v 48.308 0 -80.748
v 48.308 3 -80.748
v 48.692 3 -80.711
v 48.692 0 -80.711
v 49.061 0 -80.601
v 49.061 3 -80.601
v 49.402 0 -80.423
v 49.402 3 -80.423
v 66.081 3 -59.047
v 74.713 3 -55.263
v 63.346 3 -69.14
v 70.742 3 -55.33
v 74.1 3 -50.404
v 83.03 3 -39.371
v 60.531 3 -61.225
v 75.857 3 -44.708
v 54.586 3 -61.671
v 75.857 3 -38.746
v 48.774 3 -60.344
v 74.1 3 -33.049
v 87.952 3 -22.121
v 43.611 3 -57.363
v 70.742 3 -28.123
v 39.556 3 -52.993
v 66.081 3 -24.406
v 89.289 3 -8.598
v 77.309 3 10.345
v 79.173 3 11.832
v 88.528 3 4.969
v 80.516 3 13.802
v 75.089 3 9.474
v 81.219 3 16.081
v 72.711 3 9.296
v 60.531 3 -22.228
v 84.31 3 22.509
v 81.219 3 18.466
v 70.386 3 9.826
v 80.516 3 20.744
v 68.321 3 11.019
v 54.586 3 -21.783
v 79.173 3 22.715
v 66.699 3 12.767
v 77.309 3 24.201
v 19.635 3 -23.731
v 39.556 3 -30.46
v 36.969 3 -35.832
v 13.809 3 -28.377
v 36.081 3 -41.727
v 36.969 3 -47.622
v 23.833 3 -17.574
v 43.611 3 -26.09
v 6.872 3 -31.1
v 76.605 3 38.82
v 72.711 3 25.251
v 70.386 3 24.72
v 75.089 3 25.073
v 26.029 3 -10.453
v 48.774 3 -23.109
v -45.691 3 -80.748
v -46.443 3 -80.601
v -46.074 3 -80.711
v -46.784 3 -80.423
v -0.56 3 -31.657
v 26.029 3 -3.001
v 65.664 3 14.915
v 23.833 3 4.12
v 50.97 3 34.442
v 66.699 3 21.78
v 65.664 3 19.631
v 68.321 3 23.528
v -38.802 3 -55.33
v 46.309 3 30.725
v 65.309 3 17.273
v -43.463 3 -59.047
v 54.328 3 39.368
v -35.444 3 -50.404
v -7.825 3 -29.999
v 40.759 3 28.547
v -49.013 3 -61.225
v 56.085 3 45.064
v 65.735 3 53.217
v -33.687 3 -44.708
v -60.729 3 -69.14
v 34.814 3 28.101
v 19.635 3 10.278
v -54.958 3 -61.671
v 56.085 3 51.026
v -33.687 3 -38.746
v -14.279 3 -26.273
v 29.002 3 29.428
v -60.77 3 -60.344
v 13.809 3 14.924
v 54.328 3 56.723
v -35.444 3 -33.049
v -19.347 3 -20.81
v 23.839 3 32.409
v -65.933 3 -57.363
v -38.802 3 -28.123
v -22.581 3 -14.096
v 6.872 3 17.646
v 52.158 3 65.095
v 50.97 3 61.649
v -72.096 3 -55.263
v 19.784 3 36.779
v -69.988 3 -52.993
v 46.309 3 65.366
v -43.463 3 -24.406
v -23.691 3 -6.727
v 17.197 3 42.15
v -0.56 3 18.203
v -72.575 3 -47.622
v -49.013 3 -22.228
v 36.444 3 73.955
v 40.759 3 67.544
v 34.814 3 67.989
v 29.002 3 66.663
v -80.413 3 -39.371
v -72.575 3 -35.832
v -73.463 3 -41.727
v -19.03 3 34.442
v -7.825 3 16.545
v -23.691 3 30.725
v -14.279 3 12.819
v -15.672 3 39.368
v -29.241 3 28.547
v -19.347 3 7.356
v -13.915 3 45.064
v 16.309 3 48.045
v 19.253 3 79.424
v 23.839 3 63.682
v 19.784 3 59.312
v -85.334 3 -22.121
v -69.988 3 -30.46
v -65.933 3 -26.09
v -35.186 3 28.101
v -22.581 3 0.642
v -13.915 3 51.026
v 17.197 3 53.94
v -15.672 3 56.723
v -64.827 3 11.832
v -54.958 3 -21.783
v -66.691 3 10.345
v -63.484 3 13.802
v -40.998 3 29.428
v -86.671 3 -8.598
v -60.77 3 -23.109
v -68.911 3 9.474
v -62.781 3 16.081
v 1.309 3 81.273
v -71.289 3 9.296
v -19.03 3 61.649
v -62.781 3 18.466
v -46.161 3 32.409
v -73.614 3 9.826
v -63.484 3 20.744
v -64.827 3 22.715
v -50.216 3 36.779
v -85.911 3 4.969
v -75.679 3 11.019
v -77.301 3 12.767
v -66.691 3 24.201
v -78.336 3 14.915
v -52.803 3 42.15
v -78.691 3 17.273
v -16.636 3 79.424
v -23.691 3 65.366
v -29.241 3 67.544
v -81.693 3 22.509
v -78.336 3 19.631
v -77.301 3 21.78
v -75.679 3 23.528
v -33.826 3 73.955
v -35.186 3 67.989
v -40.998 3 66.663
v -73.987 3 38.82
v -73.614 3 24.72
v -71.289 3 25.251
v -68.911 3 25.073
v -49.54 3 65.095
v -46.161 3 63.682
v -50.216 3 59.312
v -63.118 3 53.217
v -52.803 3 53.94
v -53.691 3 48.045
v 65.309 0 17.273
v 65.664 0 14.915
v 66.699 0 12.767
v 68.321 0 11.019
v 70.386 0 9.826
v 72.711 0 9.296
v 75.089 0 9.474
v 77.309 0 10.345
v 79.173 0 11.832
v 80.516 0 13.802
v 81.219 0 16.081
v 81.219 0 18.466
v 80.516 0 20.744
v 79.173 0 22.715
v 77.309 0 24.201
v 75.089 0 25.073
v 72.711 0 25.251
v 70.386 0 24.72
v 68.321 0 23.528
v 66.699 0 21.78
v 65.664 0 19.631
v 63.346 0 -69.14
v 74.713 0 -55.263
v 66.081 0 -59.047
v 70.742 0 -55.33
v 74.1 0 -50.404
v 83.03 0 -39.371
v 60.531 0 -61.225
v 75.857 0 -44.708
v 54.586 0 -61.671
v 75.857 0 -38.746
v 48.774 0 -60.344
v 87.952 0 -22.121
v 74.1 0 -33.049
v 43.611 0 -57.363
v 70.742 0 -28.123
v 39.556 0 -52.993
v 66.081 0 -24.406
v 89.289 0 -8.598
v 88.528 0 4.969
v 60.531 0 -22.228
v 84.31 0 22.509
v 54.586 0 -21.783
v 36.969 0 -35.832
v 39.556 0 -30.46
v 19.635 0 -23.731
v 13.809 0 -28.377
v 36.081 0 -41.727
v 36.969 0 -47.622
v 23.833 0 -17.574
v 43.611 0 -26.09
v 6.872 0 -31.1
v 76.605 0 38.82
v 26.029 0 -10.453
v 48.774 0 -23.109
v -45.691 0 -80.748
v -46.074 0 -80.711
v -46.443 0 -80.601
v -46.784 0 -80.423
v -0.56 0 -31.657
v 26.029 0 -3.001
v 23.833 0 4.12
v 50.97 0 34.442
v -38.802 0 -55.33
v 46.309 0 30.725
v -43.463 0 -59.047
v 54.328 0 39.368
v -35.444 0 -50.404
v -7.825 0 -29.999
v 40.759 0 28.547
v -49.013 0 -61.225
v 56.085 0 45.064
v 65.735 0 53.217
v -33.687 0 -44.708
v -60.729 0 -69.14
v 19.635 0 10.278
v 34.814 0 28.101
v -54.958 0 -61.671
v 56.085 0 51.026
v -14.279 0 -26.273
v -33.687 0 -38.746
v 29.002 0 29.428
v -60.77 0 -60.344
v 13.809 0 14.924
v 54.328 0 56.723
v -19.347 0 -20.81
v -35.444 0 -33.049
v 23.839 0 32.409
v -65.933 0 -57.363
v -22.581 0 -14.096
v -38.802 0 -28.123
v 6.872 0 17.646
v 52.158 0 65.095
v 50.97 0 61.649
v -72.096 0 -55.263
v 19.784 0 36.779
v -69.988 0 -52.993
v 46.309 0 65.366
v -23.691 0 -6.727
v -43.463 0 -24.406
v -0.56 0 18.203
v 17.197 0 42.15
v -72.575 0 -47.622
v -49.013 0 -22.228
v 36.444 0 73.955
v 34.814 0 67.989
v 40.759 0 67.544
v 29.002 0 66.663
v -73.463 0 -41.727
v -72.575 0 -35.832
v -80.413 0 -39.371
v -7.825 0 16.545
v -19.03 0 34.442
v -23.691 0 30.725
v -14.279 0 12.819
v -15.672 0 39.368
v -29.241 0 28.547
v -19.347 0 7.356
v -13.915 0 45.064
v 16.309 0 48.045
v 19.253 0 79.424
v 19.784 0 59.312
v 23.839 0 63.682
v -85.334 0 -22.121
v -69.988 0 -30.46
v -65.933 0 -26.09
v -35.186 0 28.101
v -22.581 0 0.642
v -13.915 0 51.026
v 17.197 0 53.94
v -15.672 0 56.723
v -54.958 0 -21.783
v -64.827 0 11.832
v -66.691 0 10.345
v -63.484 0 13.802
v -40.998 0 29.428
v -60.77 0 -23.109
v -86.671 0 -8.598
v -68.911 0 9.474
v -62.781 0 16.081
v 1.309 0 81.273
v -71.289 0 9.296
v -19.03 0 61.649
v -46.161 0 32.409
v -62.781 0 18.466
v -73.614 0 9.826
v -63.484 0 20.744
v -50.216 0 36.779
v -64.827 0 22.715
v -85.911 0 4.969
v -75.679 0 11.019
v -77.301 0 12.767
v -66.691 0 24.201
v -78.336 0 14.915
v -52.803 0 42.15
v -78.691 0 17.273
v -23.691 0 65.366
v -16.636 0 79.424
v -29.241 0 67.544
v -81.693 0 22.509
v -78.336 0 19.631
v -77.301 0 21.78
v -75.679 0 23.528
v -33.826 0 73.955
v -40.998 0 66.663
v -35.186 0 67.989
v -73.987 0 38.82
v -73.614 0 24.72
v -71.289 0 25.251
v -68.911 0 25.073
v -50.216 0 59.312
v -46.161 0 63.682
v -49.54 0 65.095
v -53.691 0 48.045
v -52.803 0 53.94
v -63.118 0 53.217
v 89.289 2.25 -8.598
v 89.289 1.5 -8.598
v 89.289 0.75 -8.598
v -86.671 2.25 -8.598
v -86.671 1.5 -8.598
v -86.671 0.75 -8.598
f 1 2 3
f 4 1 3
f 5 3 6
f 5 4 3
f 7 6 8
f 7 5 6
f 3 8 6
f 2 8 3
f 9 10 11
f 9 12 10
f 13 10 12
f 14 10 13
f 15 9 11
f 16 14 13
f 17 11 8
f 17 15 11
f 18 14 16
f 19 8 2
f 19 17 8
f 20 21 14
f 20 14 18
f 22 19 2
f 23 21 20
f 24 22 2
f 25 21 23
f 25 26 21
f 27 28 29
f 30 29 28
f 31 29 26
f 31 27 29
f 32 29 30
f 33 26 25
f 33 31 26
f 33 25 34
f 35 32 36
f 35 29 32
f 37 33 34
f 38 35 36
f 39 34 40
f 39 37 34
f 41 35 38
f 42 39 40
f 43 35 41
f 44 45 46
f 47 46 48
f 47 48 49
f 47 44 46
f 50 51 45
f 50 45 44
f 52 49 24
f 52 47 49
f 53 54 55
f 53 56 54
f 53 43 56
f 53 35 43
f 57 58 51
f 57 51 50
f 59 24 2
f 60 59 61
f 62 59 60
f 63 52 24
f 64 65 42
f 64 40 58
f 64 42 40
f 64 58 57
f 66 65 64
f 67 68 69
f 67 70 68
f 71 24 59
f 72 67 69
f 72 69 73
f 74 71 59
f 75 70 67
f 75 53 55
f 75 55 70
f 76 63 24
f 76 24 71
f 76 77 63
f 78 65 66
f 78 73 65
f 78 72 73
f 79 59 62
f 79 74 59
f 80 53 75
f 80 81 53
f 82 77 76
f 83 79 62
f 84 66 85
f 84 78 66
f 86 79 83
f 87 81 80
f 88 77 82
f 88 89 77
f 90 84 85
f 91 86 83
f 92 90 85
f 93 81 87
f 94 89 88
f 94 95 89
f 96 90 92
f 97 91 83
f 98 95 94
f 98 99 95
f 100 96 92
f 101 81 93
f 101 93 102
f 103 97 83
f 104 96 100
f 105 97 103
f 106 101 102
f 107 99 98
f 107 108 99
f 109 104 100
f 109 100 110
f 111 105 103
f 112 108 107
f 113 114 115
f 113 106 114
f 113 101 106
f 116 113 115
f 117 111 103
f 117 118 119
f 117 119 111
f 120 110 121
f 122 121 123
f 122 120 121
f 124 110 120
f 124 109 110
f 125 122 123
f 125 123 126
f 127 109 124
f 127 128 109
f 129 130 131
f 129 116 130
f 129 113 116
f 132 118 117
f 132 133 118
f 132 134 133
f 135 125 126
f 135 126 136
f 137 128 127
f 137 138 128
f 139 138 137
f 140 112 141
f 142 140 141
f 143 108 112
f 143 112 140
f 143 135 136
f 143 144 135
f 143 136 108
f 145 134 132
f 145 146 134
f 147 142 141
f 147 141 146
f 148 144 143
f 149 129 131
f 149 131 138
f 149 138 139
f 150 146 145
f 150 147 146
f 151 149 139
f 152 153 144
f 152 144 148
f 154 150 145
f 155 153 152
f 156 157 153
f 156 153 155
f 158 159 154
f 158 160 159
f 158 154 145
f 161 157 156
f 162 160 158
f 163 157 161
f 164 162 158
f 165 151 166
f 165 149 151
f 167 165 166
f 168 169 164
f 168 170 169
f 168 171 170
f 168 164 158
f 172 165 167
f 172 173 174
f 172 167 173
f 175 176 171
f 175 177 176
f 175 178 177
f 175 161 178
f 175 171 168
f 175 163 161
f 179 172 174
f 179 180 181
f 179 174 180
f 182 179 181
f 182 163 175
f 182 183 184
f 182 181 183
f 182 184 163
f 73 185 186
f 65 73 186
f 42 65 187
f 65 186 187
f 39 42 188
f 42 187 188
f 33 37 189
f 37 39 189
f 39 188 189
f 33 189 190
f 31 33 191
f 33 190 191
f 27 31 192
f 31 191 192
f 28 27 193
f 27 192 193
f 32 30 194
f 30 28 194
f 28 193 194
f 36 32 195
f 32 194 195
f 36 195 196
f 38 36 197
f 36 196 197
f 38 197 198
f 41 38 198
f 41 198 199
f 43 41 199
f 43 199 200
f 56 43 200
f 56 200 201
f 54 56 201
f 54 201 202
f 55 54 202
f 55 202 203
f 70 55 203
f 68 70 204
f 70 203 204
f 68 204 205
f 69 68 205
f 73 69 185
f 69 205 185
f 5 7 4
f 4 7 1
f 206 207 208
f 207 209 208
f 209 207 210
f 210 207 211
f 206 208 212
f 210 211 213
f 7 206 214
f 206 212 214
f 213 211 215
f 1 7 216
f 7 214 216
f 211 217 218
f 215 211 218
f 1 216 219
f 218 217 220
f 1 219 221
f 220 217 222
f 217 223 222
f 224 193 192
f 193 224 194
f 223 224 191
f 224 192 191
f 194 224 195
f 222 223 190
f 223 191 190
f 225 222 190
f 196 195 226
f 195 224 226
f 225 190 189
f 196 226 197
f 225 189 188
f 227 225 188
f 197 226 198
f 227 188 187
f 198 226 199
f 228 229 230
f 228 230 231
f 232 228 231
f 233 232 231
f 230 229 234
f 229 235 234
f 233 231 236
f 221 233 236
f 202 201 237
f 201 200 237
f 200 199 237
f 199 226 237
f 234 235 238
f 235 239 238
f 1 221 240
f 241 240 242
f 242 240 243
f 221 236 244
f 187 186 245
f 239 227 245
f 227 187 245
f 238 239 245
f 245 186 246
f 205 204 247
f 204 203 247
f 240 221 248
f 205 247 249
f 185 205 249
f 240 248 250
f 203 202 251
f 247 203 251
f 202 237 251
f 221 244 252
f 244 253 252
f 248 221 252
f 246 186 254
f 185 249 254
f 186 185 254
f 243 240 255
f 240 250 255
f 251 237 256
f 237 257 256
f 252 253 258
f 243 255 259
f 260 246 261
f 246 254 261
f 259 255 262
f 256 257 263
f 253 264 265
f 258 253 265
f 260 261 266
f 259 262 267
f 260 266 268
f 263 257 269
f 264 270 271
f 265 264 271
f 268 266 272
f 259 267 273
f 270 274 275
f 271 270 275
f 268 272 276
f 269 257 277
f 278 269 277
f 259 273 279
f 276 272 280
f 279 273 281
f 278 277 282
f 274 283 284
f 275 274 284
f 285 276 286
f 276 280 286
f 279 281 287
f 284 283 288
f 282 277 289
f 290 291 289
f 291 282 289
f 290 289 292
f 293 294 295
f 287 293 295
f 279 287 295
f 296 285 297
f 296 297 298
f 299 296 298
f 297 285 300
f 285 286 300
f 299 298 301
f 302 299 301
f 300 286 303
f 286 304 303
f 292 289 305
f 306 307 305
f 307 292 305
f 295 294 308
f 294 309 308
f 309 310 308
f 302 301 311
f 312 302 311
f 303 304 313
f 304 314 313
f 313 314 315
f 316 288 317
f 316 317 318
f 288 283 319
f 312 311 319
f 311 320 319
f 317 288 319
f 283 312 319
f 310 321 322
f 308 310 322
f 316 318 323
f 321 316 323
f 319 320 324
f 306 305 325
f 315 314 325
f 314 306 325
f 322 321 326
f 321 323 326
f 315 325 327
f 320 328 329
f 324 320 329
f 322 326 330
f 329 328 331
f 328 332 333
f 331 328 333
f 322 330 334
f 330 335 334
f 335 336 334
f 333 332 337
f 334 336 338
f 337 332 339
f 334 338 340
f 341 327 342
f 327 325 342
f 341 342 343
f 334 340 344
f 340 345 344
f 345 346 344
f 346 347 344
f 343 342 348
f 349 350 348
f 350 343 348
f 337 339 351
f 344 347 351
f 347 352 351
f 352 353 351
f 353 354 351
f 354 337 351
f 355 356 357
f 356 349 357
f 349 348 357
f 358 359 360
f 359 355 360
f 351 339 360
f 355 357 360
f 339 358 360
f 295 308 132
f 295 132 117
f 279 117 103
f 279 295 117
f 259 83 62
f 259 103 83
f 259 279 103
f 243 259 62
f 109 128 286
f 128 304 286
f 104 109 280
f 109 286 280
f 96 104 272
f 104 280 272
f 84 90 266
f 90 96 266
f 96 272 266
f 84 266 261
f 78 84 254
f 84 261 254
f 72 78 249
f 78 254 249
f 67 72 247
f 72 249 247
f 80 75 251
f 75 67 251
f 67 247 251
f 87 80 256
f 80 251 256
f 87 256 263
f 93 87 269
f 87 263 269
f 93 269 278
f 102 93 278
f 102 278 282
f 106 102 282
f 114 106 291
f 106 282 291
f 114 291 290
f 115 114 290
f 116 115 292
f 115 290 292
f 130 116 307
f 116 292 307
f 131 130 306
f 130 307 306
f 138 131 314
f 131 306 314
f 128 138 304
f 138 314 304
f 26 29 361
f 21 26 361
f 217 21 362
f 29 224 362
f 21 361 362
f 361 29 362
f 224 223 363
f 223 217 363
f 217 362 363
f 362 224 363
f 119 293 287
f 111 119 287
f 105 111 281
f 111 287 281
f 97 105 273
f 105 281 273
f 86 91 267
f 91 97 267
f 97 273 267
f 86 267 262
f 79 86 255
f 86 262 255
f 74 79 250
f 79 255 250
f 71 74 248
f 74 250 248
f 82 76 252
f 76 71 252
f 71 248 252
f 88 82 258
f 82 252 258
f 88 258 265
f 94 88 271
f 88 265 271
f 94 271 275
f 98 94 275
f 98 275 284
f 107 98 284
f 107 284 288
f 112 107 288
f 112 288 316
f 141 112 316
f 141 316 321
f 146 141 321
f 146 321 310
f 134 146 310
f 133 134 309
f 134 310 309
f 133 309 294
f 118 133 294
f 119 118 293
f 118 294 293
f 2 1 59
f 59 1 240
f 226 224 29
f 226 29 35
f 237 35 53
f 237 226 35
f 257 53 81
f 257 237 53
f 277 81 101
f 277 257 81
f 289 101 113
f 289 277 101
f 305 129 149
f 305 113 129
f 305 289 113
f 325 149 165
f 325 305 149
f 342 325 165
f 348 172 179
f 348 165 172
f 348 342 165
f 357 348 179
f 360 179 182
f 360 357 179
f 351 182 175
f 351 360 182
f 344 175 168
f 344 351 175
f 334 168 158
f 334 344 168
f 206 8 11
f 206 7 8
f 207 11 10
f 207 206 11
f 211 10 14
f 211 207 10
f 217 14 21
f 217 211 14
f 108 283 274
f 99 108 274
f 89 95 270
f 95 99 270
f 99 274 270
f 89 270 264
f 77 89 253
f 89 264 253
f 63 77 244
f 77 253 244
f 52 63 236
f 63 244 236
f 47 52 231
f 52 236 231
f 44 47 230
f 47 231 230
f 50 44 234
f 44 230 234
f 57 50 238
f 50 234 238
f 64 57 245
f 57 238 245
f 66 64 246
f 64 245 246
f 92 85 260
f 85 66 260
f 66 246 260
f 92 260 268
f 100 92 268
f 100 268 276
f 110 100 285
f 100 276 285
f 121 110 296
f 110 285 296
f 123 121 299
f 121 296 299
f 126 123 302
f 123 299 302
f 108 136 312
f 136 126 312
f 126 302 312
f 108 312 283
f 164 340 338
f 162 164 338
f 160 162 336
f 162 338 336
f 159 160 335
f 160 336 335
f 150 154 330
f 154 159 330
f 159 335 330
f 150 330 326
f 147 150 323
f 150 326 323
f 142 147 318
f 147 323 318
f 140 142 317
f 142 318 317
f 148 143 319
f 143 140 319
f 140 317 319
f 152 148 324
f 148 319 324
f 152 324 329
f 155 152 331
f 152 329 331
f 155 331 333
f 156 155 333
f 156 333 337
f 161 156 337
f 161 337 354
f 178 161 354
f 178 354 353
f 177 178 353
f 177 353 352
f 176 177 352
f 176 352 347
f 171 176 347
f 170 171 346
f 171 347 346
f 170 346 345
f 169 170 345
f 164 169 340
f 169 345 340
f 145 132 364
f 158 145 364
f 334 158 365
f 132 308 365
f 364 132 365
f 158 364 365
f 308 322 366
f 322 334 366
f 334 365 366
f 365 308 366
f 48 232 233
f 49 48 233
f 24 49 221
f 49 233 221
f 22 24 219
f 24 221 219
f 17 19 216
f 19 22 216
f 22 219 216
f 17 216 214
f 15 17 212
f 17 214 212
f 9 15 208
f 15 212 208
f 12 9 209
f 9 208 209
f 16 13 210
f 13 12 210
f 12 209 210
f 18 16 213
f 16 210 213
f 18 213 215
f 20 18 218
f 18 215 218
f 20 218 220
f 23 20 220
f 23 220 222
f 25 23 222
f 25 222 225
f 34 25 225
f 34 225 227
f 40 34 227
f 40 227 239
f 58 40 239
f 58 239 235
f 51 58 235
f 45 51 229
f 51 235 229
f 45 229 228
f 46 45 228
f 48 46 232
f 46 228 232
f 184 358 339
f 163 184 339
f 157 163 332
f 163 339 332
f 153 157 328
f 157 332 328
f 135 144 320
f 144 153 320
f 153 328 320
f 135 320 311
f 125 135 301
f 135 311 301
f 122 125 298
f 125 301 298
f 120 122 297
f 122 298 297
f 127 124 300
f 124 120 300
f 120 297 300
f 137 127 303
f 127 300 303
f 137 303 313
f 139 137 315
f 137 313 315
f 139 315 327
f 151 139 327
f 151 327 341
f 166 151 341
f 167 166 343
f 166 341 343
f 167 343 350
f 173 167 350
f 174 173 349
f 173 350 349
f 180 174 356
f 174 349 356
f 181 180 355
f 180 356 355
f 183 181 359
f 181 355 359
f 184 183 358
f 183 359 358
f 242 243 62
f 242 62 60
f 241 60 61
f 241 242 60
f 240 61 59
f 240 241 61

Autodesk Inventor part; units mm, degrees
ref_plane "YZ Plane" through (0, 0, 0) normal (1, 0, 0) x (0, 1, 0)
ref_plane "XZ Plane" through (0, 0, 0) normal (0, 1, 0) x (-1, 0, 0)
ref_plane "XY Plane" through (0, 0, 0) normal (0, 0, 1) x (1, 0, 0)
sketch "Эскиз1" plane through (0, 0, 0) normal (0, 1, 0) x (-1, 0, 0)
  arc A0 (46.7842, -80.4226) -> (85.3343, -22.1214) centre (-1.3087, -6.7268) ccw
  spline S0 degree 3 poles (85.3343, -22.1214) (85.7228, -19.9347) (86.0863, -17.3865) (86.5105, -12.698) (86.6278, -10.6493) (86.6714, -8.5984) (86.715, -6.5474) (86.685, -4.4956) (86.4606, 0.2067) (86.2058, 2.768) (85.9106, 4.9693) knots -3.249933 -3.249933 -3.249933 -3.249933 -2.410881 -2.410881 -1.809443 -1.809443 -1.809443 -1.208005 -1.208005 -0.368953 -0.368953 -0.368953 -0.368953
  arc A1 (85.9106, 4.9693) -> (-88.528, 4.9693) centre (-1.3087, -6.7268) ccw
  spline S1 degree 3 poles (-88.528, 4.9693) (-88.8231, 2.768) (-89.078, 0.2067) (-89.3023, -4.4956) (-89.3324, -6.5474) (-89.2888, -8.5984) (-89.2451, -10.6493) (-89.1279, -12.698) (-88.7037, -17.3865) (-88.3402, -19.9347) (-87.9517, -22.1214) knots -3.249933 -3.249933 -3.249933 -3.249933 -2.410881 -2.410881 -1.809443 -1.809443 -1.809443 -1.208005 -1.208005 -0.368953 -0.368953 -0.368953 -0.368953
  arc A2 (-87.9517, -22.1214) -> (-49.4016, -80.4226) centre (-1.3087, -6.7268) ccw
  line L0 (-48.3085, -80.7477) -> (45.6912, -80.7477)
  arc A3 (-49.4016, -80.4226) -> (-48.3085, -80.7477) centre (-48.3085, -78.7477) ccw
  arc A4 (45.6912, -80.7477) -> (46.7842, -80.4226) centre (45.6912, -78.7477) ccw
  circle A5 centre (53.4633, -41.7268) radius 20
  circle A6 centre (-56.0807, -41.7268) radius 20
  circle A7 centre (-36.3087, 48.0452) radius 20
  circle A8 centre (33.6913, 48.0452) radius 20
  circle A9 centre (-1.3087, -6.7268) radius 25
  circle A10 centre (70.6913, 17.2732) radius 3.25 construction
  circle A11 centre (-73.3087, 17.2732) radius 3.25 construction
  circle A12 centre (70.6913, 17.2732) radius 8
  circle A13 centre (-73.3087, 17.2732) radius 8
  point P0 (0, 0)
  dimension "d0" = 16
  dimension "d1" = 16
extrude "Выдавливание1" add sketch "Эскиз1" along normal blind 3
properties part number "vverh"
